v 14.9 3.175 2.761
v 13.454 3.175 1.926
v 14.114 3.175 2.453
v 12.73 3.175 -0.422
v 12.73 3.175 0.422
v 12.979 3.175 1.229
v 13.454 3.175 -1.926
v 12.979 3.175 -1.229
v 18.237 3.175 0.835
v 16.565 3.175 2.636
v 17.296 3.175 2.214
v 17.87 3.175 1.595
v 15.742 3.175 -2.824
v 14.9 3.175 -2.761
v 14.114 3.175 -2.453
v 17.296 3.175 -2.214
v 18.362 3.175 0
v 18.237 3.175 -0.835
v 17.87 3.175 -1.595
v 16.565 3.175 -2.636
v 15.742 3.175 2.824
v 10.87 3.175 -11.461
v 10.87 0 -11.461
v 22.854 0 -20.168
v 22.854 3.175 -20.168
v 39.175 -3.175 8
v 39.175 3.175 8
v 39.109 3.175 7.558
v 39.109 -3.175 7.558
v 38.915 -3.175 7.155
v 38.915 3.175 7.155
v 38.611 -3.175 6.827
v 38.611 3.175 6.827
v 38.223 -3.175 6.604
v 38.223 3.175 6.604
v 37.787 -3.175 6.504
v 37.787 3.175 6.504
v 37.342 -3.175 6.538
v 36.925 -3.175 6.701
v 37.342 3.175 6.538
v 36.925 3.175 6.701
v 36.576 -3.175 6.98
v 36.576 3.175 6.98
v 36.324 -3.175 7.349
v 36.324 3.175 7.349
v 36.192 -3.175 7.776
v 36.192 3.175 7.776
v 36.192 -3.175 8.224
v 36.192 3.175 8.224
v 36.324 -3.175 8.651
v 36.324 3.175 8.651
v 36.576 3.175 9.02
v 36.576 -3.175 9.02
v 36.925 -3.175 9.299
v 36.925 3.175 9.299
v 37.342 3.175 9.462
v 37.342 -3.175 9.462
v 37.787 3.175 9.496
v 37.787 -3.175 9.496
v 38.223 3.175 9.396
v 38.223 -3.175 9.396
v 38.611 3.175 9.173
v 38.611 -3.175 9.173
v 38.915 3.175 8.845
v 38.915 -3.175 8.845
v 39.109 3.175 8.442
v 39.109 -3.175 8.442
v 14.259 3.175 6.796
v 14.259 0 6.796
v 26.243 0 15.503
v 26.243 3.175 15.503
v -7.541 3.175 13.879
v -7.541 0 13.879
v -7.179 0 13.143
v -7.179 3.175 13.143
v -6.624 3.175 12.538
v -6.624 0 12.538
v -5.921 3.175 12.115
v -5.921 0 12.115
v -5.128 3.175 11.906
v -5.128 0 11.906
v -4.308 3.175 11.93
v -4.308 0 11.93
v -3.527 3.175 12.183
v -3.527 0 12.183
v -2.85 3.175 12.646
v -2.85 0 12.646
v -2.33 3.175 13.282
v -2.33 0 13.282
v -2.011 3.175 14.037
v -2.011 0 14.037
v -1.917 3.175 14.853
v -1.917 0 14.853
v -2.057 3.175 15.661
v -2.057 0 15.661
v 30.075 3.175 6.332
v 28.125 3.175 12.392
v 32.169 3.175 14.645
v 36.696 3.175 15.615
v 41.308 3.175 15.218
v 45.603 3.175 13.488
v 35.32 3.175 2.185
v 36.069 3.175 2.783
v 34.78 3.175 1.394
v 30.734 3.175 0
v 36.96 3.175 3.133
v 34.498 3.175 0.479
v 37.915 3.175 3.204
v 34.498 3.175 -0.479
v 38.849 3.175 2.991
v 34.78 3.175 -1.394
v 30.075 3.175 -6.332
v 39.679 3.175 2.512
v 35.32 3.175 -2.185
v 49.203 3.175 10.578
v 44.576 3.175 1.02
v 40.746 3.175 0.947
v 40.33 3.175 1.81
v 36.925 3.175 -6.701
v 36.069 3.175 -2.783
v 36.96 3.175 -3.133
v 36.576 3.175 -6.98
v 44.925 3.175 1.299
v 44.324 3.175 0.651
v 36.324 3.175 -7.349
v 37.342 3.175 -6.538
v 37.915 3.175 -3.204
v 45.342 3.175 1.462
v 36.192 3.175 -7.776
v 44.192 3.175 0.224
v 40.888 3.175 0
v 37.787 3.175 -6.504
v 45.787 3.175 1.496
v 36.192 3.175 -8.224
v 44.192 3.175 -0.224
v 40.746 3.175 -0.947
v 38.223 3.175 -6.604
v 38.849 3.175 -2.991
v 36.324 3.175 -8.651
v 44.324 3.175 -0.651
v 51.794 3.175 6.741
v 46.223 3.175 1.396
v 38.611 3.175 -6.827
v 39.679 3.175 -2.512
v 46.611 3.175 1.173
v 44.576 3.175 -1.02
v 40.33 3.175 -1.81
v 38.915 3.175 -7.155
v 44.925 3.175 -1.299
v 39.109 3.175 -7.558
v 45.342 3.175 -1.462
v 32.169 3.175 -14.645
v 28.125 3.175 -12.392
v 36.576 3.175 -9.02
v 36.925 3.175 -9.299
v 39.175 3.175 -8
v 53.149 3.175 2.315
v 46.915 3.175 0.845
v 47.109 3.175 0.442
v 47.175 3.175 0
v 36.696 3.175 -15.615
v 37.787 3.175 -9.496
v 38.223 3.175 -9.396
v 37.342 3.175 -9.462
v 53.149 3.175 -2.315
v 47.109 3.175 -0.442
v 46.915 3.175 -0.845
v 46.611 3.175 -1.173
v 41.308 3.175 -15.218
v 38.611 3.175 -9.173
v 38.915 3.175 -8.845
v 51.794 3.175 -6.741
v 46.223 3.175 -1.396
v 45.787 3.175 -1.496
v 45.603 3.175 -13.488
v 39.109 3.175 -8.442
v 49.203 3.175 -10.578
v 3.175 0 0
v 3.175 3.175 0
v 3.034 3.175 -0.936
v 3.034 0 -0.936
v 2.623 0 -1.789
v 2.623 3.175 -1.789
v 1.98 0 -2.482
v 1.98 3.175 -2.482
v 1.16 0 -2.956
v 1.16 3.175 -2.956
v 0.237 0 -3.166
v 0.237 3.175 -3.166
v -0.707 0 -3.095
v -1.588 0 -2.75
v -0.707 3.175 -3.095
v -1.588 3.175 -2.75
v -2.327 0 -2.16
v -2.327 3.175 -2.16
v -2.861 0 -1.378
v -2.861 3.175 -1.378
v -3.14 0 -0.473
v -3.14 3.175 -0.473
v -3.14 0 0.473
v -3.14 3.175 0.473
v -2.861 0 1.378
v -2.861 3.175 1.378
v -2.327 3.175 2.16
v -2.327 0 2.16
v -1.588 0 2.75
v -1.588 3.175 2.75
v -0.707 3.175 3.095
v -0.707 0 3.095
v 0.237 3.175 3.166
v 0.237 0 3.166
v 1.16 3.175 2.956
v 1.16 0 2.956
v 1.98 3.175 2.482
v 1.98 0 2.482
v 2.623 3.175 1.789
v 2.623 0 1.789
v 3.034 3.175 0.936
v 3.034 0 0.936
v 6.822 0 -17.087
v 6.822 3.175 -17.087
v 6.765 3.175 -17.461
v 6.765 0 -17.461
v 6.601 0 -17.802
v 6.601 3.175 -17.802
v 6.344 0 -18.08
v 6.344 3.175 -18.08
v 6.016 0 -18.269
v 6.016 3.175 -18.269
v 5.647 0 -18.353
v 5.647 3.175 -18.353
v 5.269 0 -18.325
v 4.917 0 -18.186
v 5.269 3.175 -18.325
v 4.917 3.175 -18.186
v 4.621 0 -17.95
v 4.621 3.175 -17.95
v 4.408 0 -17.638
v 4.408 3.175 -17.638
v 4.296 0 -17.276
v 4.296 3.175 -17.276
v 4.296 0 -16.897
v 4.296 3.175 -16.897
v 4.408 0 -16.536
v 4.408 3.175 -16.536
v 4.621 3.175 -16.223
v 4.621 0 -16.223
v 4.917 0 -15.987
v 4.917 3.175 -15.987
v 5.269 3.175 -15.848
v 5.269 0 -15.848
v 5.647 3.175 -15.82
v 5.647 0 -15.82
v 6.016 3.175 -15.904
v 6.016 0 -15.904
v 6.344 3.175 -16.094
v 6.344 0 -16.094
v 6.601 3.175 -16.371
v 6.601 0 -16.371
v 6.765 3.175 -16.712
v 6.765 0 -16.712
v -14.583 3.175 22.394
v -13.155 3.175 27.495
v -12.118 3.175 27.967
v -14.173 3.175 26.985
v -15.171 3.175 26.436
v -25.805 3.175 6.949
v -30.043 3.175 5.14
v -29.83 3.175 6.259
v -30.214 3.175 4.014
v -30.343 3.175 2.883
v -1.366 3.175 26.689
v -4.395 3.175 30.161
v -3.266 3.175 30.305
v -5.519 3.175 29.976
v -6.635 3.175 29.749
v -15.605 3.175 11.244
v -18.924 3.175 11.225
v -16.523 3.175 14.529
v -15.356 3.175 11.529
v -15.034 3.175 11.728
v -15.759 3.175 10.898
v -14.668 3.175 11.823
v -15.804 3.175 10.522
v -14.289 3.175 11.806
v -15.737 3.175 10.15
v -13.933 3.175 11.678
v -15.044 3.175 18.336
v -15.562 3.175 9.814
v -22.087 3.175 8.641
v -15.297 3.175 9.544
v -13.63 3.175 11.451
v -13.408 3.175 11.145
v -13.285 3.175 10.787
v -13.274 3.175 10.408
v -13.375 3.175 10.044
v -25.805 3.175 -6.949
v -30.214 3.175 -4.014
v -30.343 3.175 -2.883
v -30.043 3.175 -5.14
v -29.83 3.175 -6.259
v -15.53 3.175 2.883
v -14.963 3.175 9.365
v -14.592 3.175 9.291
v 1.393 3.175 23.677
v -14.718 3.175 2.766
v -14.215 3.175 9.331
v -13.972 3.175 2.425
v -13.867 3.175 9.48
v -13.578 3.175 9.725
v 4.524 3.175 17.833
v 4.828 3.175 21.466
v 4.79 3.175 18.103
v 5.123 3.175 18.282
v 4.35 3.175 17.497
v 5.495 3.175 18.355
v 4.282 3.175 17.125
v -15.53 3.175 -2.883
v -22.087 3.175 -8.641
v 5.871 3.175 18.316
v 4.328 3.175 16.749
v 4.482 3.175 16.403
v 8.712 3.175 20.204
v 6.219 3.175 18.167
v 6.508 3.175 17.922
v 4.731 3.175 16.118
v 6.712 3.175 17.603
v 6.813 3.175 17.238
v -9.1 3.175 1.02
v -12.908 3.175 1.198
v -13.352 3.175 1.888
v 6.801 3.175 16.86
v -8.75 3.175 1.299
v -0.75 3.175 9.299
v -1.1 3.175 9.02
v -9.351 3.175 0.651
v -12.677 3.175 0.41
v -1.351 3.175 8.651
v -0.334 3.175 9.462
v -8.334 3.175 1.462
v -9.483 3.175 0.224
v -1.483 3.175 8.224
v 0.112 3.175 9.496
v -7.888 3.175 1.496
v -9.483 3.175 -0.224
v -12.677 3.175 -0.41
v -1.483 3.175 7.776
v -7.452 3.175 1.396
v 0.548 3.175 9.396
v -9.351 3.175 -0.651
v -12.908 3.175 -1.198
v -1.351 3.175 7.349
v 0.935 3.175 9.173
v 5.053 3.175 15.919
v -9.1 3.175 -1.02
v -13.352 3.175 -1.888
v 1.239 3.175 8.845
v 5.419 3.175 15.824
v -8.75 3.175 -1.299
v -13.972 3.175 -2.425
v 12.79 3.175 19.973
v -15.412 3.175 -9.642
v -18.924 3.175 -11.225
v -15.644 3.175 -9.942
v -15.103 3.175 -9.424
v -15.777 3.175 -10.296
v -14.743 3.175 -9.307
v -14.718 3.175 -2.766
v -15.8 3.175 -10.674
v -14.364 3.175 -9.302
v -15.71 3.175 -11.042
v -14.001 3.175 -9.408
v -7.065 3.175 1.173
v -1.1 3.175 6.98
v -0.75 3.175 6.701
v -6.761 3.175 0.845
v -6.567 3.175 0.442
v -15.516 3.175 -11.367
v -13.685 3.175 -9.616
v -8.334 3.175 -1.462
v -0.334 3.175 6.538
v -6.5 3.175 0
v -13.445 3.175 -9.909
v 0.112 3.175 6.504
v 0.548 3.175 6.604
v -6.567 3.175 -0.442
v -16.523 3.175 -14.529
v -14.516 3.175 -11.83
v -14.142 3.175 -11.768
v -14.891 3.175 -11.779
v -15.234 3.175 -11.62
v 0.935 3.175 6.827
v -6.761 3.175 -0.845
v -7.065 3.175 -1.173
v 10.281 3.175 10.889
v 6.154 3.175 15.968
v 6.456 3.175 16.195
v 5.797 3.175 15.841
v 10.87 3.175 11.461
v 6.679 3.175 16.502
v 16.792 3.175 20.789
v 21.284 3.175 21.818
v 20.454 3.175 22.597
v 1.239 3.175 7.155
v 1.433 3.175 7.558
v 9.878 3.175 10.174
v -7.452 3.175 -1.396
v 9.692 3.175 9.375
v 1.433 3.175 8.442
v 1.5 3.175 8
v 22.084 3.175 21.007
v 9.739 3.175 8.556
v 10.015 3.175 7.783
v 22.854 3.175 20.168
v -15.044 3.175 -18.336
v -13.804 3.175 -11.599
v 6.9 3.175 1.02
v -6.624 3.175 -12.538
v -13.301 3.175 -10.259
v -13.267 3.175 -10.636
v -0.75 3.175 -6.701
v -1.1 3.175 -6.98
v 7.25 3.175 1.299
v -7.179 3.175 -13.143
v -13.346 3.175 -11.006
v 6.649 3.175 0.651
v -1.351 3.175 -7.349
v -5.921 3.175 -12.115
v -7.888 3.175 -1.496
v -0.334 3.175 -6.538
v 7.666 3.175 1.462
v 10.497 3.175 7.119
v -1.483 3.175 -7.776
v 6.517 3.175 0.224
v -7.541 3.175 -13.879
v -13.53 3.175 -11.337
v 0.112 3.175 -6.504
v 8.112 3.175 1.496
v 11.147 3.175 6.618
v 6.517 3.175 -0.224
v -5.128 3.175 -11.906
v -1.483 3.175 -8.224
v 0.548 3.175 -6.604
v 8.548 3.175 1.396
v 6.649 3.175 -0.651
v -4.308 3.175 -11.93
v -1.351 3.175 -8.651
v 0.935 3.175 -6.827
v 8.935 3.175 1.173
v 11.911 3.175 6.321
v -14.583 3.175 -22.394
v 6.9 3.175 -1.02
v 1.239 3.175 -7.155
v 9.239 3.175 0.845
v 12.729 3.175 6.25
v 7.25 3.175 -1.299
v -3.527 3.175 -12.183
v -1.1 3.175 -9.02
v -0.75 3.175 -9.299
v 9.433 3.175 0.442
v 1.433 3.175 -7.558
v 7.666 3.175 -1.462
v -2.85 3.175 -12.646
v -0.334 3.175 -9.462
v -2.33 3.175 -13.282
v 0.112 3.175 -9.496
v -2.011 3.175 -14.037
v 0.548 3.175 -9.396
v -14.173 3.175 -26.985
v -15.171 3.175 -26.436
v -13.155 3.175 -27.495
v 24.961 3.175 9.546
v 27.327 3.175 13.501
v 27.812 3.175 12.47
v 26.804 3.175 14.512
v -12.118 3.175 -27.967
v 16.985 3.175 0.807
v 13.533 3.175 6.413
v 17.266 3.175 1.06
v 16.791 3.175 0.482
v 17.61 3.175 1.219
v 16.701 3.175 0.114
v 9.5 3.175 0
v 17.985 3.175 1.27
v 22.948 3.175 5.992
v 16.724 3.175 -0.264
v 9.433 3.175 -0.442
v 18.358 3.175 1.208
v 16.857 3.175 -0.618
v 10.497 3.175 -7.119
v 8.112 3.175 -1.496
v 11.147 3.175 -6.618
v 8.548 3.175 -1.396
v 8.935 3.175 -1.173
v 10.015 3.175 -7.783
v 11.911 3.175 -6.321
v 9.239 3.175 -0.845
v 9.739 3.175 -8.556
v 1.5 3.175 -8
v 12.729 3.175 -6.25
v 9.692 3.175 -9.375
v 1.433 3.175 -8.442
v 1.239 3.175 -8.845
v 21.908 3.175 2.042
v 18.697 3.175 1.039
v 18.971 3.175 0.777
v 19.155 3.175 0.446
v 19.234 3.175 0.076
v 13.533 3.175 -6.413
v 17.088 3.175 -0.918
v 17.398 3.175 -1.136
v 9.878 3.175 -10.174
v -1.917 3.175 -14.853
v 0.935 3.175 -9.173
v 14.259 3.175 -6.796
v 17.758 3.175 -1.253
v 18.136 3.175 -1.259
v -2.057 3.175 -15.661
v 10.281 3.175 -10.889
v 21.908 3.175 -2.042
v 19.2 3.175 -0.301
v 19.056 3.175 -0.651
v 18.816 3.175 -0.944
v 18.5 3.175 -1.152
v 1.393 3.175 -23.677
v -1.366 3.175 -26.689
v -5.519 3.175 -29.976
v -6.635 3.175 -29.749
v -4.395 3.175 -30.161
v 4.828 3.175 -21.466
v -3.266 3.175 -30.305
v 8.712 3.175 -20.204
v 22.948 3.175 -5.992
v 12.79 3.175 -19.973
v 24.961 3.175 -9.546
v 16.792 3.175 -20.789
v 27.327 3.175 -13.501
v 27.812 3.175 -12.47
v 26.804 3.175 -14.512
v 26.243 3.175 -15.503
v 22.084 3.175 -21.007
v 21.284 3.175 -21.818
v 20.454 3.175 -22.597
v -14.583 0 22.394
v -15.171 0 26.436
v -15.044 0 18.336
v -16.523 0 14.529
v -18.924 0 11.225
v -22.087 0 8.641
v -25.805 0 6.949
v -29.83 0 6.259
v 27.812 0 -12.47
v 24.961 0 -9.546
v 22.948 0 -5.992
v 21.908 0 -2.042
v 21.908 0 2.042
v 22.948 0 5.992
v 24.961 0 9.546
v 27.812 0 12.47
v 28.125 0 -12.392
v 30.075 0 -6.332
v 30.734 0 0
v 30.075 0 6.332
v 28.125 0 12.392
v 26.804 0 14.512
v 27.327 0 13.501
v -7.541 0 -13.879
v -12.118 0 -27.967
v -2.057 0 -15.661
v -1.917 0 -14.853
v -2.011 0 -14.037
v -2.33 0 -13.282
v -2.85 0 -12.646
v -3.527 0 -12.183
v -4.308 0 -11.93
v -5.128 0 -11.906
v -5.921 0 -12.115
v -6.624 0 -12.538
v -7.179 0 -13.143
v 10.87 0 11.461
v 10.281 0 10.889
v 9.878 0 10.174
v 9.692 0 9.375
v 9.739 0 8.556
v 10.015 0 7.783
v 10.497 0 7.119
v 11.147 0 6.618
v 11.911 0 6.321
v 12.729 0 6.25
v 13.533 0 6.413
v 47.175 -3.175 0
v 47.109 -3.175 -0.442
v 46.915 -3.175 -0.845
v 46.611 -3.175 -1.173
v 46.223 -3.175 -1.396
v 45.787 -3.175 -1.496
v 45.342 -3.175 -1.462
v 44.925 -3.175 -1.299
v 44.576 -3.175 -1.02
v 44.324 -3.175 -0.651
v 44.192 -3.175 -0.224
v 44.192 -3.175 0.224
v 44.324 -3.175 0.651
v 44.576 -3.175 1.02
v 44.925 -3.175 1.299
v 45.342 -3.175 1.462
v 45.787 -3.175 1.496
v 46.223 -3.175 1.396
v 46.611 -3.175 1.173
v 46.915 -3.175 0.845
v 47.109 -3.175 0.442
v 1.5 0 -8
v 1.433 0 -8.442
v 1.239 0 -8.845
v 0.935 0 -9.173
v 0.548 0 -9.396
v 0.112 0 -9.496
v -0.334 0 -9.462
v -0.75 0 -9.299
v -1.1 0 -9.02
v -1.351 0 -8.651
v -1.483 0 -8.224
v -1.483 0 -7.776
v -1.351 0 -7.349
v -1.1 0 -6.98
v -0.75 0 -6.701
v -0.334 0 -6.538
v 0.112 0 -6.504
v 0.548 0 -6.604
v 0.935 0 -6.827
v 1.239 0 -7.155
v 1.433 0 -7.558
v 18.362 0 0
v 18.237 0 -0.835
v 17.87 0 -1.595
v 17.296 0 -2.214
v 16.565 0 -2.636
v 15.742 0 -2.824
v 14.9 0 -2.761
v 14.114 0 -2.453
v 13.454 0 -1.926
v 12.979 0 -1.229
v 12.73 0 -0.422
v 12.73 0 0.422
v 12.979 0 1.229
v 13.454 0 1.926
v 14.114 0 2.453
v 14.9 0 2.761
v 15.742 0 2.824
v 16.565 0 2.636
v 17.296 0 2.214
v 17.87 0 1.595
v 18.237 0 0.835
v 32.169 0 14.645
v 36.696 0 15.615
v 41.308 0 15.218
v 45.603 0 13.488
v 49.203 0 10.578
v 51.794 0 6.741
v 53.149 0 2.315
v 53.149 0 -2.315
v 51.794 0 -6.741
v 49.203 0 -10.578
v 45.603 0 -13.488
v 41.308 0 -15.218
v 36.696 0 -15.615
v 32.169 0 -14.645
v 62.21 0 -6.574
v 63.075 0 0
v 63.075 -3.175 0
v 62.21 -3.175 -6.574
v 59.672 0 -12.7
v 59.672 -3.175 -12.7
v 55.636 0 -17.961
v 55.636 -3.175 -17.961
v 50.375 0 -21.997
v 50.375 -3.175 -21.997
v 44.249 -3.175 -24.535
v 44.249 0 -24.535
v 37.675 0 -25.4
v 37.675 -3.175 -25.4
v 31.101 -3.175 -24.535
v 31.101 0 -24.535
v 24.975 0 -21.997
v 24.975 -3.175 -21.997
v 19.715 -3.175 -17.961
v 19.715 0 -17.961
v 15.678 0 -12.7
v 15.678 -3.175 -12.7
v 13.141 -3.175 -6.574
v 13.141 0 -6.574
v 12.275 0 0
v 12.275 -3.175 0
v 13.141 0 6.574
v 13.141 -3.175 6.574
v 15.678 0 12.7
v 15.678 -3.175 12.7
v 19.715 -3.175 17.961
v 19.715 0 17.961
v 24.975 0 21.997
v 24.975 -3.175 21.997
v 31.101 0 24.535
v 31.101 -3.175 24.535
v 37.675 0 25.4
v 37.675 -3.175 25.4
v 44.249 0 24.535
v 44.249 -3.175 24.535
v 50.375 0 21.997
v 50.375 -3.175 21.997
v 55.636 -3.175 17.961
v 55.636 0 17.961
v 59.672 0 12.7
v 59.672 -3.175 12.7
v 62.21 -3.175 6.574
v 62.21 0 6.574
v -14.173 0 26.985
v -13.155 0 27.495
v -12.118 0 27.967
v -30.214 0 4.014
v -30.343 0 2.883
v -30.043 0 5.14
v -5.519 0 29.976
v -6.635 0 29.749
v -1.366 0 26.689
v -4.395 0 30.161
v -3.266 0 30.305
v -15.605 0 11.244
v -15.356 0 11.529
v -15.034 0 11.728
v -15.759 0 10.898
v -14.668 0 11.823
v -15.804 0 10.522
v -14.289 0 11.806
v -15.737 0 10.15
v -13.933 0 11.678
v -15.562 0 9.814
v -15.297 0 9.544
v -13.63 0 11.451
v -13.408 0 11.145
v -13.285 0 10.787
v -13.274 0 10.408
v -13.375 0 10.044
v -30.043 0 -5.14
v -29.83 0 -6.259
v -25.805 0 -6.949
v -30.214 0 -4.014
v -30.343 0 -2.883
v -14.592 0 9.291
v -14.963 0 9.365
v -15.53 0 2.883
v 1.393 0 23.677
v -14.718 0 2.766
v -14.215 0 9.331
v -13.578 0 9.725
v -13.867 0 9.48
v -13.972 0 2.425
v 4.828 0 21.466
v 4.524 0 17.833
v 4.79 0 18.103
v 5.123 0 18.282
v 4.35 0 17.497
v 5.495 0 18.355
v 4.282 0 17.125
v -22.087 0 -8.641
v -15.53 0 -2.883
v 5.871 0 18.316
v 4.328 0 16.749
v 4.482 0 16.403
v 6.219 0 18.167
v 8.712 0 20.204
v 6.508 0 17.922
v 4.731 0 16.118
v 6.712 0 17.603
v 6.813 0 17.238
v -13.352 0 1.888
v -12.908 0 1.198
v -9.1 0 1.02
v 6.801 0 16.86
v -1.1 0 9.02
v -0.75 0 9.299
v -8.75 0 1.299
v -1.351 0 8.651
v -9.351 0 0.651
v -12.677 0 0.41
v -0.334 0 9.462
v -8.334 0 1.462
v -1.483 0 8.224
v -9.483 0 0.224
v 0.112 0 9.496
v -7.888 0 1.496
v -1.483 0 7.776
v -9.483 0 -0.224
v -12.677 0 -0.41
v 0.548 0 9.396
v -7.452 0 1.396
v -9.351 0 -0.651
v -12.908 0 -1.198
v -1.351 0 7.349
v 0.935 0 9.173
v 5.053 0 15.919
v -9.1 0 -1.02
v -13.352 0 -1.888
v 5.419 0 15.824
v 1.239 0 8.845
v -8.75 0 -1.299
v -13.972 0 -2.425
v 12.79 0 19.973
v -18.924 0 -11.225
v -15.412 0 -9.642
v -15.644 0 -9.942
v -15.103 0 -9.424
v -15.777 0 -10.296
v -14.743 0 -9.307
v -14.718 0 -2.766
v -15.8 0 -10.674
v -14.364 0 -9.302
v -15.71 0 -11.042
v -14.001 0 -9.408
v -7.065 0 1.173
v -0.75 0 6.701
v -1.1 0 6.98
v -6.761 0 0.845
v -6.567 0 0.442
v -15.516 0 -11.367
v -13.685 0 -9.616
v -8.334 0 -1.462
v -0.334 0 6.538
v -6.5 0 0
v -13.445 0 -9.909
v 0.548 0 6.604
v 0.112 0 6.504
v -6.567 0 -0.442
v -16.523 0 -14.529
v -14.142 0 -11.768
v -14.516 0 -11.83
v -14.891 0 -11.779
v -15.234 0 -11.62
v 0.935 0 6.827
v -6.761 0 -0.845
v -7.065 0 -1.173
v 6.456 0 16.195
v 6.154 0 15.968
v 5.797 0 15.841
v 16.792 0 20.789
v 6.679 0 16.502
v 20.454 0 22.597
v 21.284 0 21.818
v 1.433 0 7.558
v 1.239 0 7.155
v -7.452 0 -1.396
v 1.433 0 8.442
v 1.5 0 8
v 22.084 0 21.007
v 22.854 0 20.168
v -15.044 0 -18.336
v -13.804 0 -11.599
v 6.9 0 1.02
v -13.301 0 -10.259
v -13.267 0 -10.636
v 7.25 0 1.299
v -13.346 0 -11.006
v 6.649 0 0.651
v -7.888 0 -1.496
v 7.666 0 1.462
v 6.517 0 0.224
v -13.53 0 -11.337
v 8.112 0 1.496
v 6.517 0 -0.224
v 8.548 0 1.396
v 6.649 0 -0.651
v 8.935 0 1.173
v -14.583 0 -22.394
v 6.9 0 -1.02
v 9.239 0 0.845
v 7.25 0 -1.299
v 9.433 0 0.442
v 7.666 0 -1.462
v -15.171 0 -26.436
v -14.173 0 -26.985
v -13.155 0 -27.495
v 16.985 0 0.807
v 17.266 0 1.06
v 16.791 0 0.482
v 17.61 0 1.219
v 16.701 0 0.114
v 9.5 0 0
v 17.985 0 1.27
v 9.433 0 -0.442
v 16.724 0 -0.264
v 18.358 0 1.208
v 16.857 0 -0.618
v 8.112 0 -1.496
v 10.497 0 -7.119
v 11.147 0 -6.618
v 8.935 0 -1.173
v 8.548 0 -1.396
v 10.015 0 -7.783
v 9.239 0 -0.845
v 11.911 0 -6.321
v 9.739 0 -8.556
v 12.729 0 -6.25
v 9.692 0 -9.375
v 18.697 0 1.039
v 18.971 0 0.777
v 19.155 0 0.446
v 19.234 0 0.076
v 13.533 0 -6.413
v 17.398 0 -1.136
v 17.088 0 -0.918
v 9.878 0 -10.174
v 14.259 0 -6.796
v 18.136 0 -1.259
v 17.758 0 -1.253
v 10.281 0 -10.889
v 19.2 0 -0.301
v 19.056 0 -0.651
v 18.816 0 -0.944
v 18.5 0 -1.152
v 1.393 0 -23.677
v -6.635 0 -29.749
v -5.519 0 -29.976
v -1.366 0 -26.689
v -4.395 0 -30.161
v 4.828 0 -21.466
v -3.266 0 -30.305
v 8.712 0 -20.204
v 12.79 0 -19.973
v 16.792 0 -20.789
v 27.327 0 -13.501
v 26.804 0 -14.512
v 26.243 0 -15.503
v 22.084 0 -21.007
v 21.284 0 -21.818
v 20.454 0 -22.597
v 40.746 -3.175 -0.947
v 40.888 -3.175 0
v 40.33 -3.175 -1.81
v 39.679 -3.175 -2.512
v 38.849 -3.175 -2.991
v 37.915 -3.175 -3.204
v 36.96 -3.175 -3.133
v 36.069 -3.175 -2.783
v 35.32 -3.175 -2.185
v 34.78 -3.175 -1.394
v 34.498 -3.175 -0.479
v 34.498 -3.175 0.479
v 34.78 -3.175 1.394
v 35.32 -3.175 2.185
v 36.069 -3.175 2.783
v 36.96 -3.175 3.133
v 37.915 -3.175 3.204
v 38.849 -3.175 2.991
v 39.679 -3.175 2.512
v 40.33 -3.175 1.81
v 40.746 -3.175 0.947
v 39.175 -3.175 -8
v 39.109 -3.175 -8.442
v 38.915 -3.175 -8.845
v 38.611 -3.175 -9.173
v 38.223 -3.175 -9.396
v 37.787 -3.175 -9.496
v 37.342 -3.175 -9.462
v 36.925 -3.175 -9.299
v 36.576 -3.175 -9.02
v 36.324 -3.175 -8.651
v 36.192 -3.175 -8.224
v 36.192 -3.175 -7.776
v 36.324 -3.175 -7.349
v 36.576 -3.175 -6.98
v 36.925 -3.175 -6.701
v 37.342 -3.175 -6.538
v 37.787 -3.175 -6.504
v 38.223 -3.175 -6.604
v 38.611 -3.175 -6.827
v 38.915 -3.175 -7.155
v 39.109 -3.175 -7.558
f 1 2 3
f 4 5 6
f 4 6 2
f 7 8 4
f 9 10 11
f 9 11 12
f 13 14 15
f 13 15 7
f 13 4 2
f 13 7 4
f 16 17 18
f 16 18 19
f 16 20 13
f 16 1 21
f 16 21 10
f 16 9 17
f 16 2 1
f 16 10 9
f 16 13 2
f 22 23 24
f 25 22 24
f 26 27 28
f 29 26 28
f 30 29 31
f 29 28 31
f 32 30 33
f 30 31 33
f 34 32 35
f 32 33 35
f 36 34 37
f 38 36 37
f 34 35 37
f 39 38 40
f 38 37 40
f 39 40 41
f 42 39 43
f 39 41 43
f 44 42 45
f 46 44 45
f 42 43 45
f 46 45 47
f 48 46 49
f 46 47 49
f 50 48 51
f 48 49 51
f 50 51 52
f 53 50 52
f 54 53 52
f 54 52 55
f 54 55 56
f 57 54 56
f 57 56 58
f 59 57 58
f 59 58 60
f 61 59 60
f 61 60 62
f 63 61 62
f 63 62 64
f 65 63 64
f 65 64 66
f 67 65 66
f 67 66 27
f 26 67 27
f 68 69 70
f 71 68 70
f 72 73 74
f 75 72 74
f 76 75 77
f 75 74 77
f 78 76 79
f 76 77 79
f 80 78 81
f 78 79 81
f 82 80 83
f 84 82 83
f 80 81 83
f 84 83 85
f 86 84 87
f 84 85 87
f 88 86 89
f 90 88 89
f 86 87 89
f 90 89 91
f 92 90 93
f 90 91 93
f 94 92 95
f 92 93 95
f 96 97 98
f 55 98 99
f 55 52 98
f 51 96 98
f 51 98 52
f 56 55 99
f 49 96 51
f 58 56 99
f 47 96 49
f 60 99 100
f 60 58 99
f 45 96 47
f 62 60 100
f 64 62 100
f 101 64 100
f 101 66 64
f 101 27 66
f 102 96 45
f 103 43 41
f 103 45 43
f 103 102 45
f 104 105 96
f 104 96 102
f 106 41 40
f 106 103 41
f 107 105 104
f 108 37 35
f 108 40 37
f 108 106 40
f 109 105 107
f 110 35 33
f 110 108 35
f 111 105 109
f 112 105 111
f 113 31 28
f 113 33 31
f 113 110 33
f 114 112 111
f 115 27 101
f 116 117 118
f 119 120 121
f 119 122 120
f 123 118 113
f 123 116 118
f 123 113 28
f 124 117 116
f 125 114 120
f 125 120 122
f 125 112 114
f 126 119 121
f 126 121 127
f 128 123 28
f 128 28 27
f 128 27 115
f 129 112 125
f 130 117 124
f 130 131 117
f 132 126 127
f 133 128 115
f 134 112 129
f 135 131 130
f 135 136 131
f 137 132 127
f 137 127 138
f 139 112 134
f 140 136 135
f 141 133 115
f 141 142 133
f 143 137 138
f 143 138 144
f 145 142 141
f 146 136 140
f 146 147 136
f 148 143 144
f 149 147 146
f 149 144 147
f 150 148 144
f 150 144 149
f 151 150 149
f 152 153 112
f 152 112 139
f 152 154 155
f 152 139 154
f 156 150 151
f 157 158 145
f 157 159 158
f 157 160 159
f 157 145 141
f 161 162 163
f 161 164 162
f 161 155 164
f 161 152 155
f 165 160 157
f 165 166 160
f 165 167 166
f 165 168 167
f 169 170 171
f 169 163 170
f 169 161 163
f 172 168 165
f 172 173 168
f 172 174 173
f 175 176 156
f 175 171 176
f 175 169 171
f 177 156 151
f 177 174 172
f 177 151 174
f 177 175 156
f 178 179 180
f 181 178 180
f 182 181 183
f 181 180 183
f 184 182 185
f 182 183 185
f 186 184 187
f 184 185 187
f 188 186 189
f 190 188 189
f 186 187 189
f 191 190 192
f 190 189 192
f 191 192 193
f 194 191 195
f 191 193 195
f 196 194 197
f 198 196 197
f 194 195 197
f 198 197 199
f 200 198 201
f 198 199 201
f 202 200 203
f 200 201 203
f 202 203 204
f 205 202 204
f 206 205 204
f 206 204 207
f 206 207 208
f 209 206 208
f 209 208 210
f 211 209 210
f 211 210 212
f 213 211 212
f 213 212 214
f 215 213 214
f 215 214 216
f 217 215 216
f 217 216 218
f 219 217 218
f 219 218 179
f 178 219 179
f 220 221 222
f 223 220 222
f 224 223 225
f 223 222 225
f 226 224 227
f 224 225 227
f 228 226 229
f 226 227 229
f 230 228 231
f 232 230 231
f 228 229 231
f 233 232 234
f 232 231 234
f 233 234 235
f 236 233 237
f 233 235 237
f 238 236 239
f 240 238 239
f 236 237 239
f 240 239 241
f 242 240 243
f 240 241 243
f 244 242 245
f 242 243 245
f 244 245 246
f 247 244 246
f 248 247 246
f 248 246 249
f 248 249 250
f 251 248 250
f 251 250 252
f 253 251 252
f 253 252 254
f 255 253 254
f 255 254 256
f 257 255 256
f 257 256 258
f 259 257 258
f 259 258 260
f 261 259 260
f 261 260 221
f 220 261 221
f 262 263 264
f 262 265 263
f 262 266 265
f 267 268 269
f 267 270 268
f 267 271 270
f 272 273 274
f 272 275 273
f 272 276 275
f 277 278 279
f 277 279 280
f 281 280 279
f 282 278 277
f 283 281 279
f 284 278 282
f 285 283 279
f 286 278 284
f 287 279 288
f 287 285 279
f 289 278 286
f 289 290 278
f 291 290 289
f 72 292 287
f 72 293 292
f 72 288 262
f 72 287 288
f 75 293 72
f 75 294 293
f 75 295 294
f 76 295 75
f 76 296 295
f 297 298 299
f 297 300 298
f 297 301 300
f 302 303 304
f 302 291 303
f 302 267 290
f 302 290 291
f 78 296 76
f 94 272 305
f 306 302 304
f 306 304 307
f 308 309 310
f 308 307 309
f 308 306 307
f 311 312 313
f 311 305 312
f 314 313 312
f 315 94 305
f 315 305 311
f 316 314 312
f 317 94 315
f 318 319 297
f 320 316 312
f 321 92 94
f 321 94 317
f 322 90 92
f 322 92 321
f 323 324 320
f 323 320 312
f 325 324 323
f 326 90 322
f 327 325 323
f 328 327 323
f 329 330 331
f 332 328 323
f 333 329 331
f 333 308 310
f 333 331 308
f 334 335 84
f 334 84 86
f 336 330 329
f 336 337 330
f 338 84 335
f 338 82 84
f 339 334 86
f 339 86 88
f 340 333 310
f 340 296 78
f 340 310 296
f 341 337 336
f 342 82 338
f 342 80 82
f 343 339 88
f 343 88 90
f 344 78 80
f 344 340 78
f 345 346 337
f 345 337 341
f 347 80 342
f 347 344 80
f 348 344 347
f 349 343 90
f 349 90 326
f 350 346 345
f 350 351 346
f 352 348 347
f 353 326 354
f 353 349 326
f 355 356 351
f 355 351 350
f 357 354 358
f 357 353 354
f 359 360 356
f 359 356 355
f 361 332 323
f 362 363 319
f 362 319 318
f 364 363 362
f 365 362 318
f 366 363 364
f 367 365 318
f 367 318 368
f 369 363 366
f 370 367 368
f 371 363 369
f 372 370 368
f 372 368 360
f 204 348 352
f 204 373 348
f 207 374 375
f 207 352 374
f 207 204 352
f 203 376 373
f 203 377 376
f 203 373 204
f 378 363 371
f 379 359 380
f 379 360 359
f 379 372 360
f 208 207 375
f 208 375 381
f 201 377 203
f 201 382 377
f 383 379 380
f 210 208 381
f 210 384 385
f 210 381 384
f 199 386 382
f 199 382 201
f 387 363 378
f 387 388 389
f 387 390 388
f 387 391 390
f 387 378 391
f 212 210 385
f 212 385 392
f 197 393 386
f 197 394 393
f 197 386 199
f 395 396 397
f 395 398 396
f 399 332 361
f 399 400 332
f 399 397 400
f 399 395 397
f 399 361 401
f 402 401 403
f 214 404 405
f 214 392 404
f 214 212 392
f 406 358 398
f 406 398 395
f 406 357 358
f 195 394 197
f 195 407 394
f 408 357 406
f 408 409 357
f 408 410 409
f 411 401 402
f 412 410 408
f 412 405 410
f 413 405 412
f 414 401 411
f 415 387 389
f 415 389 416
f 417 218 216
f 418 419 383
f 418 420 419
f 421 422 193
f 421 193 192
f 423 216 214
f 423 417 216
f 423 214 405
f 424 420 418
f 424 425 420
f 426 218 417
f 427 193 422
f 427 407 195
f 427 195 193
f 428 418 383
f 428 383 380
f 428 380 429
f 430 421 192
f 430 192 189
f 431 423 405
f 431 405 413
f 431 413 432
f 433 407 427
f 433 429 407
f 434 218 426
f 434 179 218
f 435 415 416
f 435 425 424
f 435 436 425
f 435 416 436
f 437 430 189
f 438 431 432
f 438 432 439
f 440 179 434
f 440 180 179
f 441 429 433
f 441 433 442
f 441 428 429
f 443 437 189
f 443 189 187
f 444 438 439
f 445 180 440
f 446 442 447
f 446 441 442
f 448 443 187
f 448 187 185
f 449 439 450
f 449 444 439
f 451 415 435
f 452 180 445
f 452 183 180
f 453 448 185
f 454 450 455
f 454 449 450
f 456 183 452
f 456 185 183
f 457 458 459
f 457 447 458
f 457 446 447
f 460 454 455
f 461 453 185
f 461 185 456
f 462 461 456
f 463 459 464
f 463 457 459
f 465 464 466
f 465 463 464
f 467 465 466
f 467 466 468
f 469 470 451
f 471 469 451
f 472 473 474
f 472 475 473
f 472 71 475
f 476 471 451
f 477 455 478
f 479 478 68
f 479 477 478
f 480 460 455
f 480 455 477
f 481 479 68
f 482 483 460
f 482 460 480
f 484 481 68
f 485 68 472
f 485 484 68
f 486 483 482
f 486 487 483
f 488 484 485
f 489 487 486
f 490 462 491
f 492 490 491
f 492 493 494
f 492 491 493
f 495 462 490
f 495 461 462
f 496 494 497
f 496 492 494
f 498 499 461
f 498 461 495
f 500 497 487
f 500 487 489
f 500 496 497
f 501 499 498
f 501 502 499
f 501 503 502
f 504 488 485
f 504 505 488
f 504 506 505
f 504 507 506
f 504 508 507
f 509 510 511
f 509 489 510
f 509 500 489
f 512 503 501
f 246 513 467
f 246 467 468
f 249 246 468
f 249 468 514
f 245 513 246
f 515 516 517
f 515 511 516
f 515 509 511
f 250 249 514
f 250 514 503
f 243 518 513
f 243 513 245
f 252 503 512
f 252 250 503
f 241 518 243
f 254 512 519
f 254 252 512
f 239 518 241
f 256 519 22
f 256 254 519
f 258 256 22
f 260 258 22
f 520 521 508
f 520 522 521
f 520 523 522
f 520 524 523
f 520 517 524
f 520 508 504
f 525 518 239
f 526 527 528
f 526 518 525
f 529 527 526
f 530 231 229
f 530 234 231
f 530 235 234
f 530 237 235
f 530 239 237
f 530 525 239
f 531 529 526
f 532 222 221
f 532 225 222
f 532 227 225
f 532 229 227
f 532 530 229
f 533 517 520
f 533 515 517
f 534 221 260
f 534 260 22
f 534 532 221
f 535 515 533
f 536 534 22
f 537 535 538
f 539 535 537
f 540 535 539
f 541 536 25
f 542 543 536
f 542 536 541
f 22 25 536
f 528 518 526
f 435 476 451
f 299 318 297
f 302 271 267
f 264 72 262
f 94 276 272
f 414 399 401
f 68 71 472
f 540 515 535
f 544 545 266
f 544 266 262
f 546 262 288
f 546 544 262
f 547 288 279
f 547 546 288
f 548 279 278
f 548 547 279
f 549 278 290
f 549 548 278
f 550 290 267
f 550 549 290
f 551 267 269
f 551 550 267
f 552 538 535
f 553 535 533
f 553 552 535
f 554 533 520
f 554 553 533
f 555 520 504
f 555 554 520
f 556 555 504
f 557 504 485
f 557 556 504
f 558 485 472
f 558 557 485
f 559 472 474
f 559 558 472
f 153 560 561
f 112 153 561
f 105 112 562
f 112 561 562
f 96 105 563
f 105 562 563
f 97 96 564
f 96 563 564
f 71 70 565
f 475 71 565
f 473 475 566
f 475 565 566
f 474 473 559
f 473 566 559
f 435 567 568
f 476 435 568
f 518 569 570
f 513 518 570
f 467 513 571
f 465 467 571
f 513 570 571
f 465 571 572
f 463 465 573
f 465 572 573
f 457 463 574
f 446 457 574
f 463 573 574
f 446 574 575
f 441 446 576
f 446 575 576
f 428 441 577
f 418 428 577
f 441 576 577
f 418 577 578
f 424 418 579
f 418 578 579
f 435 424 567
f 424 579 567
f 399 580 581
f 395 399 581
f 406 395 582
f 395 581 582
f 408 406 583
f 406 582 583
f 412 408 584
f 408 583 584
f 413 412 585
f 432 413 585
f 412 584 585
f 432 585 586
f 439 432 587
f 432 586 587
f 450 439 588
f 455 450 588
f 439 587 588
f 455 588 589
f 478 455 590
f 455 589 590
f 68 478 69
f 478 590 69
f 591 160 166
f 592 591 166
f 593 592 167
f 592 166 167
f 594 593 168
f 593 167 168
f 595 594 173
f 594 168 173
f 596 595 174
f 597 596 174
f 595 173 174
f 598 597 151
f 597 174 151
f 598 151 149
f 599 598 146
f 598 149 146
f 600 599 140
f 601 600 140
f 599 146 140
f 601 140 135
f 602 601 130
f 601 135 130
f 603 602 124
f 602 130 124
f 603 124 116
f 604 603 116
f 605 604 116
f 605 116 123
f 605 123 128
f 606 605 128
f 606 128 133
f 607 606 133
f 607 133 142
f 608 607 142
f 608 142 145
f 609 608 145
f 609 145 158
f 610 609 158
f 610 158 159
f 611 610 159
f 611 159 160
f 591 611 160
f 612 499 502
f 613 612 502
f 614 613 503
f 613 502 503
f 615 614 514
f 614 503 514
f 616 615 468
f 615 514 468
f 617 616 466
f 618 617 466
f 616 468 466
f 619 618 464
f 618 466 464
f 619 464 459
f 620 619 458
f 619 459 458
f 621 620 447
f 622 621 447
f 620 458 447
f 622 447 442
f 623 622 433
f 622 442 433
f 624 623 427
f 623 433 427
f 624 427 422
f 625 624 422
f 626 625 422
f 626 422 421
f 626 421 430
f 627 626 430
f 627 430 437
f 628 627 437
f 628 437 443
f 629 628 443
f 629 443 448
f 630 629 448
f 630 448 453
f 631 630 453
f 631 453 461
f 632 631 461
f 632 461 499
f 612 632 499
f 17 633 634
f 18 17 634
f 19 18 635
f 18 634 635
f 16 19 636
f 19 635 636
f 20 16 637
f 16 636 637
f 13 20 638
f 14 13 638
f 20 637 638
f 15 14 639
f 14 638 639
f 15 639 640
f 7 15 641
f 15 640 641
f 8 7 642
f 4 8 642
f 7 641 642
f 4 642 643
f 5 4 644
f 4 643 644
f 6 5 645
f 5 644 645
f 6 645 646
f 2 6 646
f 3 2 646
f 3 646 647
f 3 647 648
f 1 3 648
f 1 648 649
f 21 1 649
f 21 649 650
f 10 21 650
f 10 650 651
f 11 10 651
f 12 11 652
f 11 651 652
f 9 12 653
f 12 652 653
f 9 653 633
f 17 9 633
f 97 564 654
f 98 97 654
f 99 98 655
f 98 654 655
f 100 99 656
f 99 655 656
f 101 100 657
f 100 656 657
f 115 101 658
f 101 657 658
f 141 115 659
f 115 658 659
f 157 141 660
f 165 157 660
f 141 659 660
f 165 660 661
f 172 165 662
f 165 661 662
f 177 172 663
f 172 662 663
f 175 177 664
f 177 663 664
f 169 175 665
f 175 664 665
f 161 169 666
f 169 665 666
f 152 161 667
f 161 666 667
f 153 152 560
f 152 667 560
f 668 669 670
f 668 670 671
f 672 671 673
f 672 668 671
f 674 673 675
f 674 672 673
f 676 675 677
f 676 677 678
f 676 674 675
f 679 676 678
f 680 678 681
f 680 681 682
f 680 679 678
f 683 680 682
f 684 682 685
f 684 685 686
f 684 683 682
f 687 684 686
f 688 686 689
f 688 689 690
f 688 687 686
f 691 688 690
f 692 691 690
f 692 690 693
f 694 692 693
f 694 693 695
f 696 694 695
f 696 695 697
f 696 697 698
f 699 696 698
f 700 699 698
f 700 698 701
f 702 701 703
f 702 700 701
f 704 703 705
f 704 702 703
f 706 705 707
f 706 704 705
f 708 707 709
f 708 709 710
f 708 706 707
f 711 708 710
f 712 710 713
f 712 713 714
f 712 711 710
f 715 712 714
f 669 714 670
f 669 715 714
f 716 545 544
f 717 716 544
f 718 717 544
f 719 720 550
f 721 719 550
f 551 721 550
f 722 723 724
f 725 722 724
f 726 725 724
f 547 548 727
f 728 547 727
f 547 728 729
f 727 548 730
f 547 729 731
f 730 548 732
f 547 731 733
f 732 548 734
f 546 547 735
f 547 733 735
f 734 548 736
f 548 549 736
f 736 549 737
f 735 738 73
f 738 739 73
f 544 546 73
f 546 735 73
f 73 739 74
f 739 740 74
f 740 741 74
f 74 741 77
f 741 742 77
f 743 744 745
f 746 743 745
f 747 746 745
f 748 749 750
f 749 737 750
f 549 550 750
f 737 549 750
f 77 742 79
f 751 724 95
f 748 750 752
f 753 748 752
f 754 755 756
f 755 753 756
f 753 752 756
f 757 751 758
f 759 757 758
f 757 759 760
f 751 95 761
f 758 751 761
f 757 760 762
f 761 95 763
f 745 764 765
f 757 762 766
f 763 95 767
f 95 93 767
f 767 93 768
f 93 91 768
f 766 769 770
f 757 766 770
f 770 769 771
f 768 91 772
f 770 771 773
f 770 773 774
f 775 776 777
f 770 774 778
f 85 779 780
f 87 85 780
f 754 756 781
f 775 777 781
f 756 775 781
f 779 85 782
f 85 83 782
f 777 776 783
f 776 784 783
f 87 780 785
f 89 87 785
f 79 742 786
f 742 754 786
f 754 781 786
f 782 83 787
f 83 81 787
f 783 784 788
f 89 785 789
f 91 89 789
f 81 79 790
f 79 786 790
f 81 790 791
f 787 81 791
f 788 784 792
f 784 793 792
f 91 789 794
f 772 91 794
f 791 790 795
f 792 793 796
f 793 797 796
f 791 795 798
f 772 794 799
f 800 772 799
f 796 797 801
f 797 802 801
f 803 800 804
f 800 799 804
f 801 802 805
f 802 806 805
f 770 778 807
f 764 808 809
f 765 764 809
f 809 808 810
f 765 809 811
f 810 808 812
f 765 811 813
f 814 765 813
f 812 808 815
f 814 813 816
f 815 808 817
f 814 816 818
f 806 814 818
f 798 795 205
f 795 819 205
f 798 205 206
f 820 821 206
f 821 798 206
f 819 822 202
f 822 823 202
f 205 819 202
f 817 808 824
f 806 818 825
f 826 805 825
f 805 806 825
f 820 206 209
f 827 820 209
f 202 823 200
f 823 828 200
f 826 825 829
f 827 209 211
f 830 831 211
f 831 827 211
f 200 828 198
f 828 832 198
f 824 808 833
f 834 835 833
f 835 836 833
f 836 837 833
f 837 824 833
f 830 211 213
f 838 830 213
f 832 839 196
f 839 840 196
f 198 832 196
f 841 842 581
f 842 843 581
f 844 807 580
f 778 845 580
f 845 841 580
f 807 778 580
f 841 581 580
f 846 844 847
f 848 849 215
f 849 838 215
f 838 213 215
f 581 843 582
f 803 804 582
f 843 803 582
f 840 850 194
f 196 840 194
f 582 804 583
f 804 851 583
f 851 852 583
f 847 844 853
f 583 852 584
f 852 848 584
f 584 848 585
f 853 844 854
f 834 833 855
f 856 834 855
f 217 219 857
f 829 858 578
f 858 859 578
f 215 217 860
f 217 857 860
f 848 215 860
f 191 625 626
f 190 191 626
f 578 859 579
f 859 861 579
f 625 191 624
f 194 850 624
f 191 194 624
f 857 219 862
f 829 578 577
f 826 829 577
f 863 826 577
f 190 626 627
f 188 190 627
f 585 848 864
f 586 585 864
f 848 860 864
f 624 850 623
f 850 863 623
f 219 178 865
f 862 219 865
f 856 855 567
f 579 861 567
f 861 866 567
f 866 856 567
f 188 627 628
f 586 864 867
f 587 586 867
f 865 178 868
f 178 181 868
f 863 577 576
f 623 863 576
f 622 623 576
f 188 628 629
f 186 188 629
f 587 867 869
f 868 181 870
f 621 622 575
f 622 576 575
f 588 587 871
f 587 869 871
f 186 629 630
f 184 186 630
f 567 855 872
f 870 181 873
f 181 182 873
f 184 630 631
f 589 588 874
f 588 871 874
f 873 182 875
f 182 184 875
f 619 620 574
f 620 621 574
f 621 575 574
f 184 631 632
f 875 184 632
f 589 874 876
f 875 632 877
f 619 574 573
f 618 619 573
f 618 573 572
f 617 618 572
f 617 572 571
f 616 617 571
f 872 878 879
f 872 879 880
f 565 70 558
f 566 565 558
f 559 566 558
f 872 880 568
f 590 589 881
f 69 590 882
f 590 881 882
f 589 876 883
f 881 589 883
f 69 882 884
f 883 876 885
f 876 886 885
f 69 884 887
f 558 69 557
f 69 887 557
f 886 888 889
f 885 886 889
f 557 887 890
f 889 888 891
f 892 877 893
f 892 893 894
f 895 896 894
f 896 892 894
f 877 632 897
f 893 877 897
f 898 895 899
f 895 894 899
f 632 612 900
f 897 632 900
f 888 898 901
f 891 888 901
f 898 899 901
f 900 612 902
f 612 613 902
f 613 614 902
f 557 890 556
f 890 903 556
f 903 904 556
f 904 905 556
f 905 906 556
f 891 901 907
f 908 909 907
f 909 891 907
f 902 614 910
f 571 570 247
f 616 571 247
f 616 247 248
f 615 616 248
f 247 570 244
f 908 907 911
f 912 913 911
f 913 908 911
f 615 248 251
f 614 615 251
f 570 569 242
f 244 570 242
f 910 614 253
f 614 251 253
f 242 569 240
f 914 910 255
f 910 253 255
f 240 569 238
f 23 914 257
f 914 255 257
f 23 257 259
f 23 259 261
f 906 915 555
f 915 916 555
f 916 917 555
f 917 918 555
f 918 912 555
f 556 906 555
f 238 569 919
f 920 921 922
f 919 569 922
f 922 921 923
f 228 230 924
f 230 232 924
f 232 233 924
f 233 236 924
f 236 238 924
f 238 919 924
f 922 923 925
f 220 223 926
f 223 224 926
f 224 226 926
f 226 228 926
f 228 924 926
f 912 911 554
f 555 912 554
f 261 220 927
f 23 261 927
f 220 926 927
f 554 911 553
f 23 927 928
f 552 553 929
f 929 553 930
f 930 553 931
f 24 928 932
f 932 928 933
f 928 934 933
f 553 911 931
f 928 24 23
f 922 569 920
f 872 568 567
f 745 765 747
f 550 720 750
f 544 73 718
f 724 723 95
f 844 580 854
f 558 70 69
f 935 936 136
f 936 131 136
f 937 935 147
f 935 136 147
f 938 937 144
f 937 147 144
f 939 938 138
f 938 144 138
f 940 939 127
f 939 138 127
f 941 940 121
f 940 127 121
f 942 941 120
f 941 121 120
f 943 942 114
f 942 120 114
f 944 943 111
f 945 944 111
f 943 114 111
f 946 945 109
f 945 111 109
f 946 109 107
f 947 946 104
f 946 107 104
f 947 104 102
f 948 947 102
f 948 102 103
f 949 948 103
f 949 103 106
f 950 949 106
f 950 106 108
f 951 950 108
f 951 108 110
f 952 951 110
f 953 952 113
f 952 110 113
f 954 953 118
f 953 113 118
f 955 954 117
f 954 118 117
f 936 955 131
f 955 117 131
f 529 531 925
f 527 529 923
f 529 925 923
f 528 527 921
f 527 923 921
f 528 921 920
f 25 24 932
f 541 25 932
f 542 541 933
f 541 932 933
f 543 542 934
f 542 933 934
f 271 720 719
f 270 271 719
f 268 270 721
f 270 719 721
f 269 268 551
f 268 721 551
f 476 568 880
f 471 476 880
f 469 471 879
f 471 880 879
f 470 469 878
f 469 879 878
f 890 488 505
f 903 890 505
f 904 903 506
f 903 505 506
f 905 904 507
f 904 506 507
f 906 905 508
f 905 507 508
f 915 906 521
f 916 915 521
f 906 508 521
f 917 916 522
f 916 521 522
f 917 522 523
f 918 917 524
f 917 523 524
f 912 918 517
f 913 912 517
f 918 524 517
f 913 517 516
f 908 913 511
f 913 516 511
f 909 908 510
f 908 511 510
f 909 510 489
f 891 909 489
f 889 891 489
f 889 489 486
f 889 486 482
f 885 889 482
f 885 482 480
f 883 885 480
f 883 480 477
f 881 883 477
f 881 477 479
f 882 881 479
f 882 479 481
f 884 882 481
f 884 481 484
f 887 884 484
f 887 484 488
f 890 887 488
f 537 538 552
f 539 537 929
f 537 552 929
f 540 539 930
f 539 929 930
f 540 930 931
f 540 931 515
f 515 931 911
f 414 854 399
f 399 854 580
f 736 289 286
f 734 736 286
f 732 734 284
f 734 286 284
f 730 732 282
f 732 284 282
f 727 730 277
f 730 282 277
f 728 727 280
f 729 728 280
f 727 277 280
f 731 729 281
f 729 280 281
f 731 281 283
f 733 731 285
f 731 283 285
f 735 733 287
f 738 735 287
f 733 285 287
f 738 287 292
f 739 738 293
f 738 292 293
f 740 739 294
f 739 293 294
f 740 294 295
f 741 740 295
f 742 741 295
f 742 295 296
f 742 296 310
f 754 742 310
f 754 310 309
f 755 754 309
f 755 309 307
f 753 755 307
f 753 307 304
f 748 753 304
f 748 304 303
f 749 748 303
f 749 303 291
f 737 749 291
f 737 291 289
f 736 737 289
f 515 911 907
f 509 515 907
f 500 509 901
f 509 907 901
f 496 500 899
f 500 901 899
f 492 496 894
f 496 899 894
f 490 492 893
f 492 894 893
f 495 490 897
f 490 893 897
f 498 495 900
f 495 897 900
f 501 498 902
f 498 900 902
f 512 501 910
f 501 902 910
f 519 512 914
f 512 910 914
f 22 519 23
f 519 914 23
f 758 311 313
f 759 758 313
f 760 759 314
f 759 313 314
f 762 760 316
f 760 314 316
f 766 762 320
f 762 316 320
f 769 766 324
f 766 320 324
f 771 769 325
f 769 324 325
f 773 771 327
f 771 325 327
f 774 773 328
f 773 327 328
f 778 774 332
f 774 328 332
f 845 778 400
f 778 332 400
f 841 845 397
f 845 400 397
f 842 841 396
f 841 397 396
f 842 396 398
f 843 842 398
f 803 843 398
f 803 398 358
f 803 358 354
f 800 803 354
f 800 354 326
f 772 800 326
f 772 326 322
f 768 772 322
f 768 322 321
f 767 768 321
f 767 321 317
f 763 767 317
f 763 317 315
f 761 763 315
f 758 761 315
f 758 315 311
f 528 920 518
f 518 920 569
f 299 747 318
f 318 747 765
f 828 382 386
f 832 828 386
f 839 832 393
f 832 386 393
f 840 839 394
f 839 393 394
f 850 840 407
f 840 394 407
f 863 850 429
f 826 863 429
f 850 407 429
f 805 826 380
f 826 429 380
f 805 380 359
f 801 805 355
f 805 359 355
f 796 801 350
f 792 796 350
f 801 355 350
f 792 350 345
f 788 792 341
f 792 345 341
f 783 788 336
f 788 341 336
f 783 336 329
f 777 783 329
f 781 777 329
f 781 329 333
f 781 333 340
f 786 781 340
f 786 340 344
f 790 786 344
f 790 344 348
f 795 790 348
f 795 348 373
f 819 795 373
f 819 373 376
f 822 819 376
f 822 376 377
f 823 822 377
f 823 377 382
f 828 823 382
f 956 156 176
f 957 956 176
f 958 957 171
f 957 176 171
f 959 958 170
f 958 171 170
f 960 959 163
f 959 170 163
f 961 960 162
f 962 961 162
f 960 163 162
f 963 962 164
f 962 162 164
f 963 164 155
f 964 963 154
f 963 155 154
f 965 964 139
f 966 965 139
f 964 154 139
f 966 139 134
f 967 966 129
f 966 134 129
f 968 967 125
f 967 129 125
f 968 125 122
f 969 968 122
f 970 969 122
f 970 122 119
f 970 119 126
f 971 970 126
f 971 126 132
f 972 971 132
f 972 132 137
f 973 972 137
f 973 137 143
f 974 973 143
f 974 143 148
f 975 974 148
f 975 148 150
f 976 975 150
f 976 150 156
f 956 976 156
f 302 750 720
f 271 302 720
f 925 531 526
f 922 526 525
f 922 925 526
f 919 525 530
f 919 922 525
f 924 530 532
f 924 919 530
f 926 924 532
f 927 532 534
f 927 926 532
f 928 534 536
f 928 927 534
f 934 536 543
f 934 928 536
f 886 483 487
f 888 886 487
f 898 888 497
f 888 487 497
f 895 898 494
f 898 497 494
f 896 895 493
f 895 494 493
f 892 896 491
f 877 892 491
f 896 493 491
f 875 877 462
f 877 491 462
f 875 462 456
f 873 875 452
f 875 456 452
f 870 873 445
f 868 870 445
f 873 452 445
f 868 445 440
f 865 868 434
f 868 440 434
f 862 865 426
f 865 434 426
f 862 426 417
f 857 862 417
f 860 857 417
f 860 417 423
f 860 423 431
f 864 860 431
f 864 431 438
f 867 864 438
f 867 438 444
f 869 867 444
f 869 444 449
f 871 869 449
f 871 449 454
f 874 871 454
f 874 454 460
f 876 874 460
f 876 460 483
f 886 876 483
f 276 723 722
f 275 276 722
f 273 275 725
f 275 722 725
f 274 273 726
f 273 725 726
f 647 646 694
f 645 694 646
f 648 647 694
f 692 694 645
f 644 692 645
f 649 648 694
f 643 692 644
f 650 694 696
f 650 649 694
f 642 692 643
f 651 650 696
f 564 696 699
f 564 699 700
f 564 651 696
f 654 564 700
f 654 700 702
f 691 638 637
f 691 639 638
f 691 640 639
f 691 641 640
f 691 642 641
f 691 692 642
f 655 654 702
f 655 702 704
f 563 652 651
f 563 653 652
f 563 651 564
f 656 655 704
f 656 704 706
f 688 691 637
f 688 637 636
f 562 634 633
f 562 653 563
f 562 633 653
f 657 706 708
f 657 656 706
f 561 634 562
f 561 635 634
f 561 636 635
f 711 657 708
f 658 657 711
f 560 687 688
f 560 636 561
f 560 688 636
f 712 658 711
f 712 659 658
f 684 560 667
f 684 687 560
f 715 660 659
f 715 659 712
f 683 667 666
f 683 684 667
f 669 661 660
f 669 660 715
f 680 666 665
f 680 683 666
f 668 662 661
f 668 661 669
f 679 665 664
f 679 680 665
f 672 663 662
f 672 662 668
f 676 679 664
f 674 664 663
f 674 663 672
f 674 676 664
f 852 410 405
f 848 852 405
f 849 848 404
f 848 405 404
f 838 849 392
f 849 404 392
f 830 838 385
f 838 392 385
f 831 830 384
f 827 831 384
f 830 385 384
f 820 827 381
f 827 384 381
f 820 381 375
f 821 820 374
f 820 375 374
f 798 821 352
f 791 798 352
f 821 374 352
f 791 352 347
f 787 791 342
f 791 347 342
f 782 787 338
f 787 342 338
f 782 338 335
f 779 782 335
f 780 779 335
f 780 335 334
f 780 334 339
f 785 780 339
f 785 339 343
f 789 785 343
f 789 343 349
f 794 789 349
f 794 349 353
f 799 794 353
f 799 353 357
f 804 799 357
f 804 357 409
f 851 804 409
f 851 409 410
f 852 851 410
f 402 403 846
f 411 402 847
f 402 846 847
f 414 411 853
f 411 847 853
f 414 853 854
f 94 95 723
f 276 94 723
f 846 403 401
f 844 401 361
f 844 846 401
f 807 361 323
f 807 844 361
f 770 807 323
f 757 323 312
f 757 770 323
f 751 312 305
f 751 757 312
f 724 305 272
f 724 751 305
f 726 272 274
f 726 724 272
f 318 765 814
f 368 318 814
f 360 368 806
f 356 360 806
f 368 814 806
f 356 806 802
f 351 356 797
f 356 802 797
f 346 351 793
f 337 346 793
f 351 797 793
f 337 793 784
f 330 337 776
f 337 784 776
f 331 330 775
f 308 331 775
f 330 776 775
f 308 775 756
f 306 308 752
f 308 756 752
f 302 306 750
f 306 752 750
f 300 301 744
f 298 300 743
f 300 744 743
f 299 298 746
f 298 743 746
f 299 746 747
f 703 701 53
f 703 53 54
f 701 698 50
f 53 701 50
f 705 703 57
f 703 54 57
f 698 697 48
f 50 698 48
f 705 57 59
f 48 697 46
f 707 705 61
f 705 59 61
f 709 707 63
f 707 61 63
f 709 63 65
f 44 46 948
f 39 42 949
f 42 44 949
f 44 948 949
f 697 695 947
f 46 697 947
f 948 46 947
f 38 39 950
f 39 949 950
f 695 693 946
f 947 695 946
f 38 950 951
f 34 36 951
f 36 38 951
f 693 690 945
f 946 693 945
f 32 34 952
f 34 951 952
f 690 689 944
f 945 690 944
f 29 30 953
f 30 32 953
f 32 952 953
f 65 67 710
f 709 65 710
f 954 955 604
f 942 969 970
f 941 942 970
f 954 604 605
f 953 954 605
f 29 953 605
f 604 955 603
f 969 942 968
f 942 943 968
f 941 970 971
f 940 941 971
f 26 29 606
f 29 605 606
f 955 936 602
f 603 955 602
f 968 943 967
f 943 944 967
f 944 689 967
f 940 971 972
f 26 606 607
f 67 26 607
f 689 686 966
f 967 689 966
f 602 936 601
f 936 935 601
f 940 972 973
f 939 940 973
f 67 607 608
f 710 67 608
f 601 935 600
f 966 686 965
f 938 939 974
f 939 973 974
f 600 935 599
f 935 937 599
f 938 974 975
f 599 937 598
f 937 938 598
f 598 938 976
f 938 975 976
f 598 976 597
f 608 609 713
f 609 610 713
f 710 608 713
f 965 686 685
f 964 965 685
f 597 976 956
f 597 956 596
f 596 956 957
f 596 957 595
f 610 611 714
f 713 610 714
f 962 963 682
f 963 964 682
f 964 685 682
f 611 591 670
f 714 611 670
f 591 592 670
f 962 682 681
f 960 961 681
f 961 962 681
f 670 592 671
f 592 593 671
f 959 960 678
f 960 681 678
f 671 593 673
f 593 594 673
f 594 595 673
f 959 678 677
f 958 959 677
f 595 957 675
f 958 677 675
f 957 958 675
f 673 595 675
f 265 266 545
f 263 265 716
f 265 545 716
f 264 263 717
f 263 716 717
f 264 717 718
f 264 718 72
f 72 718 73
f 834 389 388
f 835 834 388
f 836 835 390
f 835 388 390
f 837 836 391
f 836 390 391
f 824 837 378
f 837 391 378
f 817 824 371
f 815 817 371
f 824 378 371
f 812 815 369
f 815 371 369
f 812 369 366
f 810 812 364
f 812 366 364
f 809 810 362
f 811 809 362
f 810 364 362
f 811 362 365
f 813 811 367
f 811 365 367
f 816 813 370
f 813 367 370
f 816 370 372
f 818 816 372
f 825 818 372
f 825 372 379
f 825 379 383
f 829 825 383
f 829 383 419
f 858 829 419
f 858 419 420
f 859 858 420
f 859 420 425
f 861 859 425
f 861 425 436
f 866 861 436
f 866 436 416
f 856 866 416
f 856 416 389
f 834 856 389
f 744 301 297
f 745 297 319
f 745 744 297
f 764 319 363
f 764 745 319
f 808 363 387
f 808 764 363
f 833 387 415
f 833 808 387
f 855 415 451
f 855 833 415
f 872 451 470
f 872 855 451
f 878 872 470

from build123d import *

# Parameters (mm, degrees)
DRIVEWHEEL_TOP_DEPTH            = 3.175
SKETCH13_R                      = 25.4
SKETCH13_R_2                    = 2.8321
WHEEL_BOTTOM_DEPTH              = 3.175
SKETCH13_4_R                    = 2.8321
PEG_DEPTH                       = 3.175
PEG_DEPTH_BACK                  = 3.175
SKETCH14_R                      = 3.2131
DRIVER_CENTER_HOLE_DEPTH        = 4.175
DRIVER_CENTER_HOLE_DEPTH_BACK   = 4.175
SKETCH16_R                      = 1.5
DRIVER_COUPLER_HOLES_DEPTH      = 7.35
MAIN_CIRCLES_R                  = 30.48
WHEELBASE_DEPTH                 = 3.175
SLOT_CUT_DEPTH                  = 4.175
SKETCH17_R                      = 3.175
WHEEL_CENTER_HOLE_DEPTH         = 7.35
DRIVEWHEEL_CONSTRUCTION_LINES_R = 15.899413966
DIVOT_DEPTH                     = 4.175
CIRCPATTERN_SLOT_COUNT          = 5
CIRCPATTERN_DIVOTS_COUNT        = 5
SKETCH18_R                      = 1.5
WHEEL_COUPLER_HOLES_DEPTH       = 7.35
SKETCH20_R                      = 1.27
CUT_EXTRUDE1_DEPTH              = 7.35
CIRPATTERN1_COUNT               = 5


with BuildPart() as part:
    # Sketch8 → drivewheel top (new body)
    with BuildSketch(Plane(origin=(0, 0, 0), x_dir=(1, 0, 0), z_dir=(0, 1, 0))):
        with BuildLine():
            ThreePointArc((28.124912082, 12.392258729), (30.734, 0), (28.124912082, -12.392258729))
            ThreePointArc((28.124912082, -12.392258729), (53.32076592, 0), (28.124912082, 12.392258729))
        make_face()
    extrude(amount=DRIVEWHEEL_TOP_DEPTH)


with BuildPart() as body_2:
    # Sketch13 → wheel bottom (new body)
    with BuildSketch(Plane(origin=(0, 0, 0), x_dir=(1, 0, 0), z_dir=(0, 1, 0))):
        with Locations((37.675351954, 0)):
            Circle(SKETCH13_R)
        with Locations((15.530335701, 0)):
            Circle(SKETCH13_R_2, mode=Mode.SUBTRACT)
    extrude(amount=-WHEEL_BOTTOM_DEPTH)

    # Sketch13_4 → peg (add, two sides)
    with BuildSketch(Plane(origin=(0, 0, 0), x_dir=(1, 0, 0), z_dir=(0, 1, 0))) as peg_sk:
        with Locations((15.530335701, 0)):
            Circle(SKETCH13_4_R)
    extrude(amount=PEG_DEPTH)
    extrude(peg_sk.sketch, amount=-PEG_DEPTH_BACK)

    # Combine1: union part
    add(part.part)

    # Sketch14 → driver center hole (cut, two sides)
    with BuildSketch(Plane(origin=(0, 0, 0), x_dir=(1, 0, 0), z_dir=(0, 1, 0))) as driver_center_hole_sk:
        with Locations((37.675351954, 0)):
            Circle(SKETCH14_R)
    extrude(amount=DRIVER_CENTER_HOLE_DEPTH, mode=Mode.SUBTRACT)
    extrude(driver_center_hole_sk.sketch, amount=-DRIVER_CENTER_HOLE_DEPTH_BACK, mode=Mode.SUBTRACT)

    # Sketch16 → driver coupler holes (cut, through all)
    with BuildSketch(Plane(origin=(0, 3.175, 0), x_dir=(1, 0, 0), z_dir=(0, 1, 0))):
        with Locations((37.675351954, -8)):
            Circle(SKETCH16_R)
        with Locations((45.675351954, 0)):
            Circle(SKETCH16_R)
        with Locations((37.675351954, 8)):
            Circle(SKETCH16_R)
    extrude(amount=-DRIVER_COUPLER_HOLES_DEPTH, mode=Mode.SUBTRACT)


with BuildPart() as body_2_2:
    # main circles → wheelbase (new body)
    with BuildSketch(Plane(origin=(0, 0, 0), x_dir=(1, 0, 0), z_dir=(0, 1, 0))):
        Circle(MAIN_CIRCLES_R)
    extrude(amount=WHEELBASE_DEPTH)

    # slot → slot cut (cut, through all)
    with BuildSketch(Plane(origin=(0, 0, 0), x_dir=(1, 0, 0), z_dir=(0, 1, 0))):
        with BuildLine():
            Line((26.353364092, 15.583379397), (14.258831614, 6.796187195))
            ThreePointArc((14.258831614, 6.796187195), (10.231990417, 7.433976184), (10.869779406, 11.460817381))
            Line((10.869779406, 11.460817381), (22.964311885, 20.248009583))
            ThreePointArc((22.964311885, 20.248009583), (26.991153082, 19.610220594), (26.353364092, 15.583379397))
        make_face()
    slot_cut = extrude(amount=SLOT_CUT_DEPTH, mode=Mode.SUBTRACT)

    # Sketch17 → wheel center hole (cut, through all)
    with BuildSketch(Plane(origin=(0, 3.175, 0), x_dir=(1, 0, 0), z_dir=(0, 1, 0))):
        Circle(SKETCH17_R)
    extrude(amount=-WHEEL_CENTER_HOLE_DEPTH, mode=Mode.SUBTRACT)

    # drivewheel construction lines → divot (cut, through all)
    with BuildSketch(Plane(origin=(0, 0, 0), x_dir=(1, 0, 0), z_dir=(0, 1, 0))):
        with Locations((37.675351954, 0)):
            Circle(DRIVEWHEEL_CONSTRUCTION_LINES_R)
    divot = extrude(amount=DIVOT_DEPTH, mode=Mode.SUBTRACT)

    # circpattern-slot: slot cut ×5 about axis
    circpattern_slot_axis = Axis((0, 0, 0), (0, 1, 0))
    for i in range(1, CIRCPATTERN_SLOT_COUNT):
        add(slot_cut.rotate(circpattern_slot_axis, i * 360 / CIRCPATTERN_SLOT_COUNT), mode=Mode.SUBTRACT)

    # circpattern-divots: divot ×5 about axis
    circpattern_divots_axis = Axis((0, 0, 0), (0, 1, 0))
    for i in range(1, CIRCPATTERN_DIVOTS_COUNT):
        add(divot.rotate(circpattern_divots_axis, i * 360 / CIRCPATTERN_DIVOTS_COUNT), mode=Mode.SUBTRACT)

    # Sketch18 → wheel coupler holes (cut, through all)
    with BuildSketch(Plane(origin=(0, 3.175, 0), x_dir=(1, 0, 0), z_dir=(0, 1, 0))):
        with Locations((0, 8)):
            Circle(SKETCH18_R)
        with Locations((-8, 0)):
            Circle(SKETCH18_R)
        with Locations((0, -8)):
            Circle(SKETCH18_R)
        with Locations((8, 0)):
            Circle(SKETCH18_R)
    extrude(amount=-WHEEL_COUPLER_HOLES_DEPTH, mode=Mode.SUBTRACT)

    # Sketch20 → Cut-Extrude1 (cut, through all)
    with BuildSketch(Plane(origin=(0, 3.175, 0), x_dir=(1, 0, 0), z_dir=(0, 1, 0))):
        with Locations((5.551780158, 17.086622395)):
            Circle(SKETCH20_R)
    cut_extrude1 = extrude(amount=-CUT_EXTRUDE1_DEPTH, mode=Mode.SUBTRACT)

    # CirPattern1: Cut-Extrude1 ×5 about axis
    cirpattern1_axis = Axis((0, 0, 0), (0, 1, 0))
    for i in range(1, CIRPATTERN1_COUNT):
        add(cut_extrude1.rotate(cirpattern1_axis, i * 360 / CIRPATTERN1_COUNT), mode=Mode.SUBTRACT)


solid = Compound([body_2.part, body_2_2.part])
